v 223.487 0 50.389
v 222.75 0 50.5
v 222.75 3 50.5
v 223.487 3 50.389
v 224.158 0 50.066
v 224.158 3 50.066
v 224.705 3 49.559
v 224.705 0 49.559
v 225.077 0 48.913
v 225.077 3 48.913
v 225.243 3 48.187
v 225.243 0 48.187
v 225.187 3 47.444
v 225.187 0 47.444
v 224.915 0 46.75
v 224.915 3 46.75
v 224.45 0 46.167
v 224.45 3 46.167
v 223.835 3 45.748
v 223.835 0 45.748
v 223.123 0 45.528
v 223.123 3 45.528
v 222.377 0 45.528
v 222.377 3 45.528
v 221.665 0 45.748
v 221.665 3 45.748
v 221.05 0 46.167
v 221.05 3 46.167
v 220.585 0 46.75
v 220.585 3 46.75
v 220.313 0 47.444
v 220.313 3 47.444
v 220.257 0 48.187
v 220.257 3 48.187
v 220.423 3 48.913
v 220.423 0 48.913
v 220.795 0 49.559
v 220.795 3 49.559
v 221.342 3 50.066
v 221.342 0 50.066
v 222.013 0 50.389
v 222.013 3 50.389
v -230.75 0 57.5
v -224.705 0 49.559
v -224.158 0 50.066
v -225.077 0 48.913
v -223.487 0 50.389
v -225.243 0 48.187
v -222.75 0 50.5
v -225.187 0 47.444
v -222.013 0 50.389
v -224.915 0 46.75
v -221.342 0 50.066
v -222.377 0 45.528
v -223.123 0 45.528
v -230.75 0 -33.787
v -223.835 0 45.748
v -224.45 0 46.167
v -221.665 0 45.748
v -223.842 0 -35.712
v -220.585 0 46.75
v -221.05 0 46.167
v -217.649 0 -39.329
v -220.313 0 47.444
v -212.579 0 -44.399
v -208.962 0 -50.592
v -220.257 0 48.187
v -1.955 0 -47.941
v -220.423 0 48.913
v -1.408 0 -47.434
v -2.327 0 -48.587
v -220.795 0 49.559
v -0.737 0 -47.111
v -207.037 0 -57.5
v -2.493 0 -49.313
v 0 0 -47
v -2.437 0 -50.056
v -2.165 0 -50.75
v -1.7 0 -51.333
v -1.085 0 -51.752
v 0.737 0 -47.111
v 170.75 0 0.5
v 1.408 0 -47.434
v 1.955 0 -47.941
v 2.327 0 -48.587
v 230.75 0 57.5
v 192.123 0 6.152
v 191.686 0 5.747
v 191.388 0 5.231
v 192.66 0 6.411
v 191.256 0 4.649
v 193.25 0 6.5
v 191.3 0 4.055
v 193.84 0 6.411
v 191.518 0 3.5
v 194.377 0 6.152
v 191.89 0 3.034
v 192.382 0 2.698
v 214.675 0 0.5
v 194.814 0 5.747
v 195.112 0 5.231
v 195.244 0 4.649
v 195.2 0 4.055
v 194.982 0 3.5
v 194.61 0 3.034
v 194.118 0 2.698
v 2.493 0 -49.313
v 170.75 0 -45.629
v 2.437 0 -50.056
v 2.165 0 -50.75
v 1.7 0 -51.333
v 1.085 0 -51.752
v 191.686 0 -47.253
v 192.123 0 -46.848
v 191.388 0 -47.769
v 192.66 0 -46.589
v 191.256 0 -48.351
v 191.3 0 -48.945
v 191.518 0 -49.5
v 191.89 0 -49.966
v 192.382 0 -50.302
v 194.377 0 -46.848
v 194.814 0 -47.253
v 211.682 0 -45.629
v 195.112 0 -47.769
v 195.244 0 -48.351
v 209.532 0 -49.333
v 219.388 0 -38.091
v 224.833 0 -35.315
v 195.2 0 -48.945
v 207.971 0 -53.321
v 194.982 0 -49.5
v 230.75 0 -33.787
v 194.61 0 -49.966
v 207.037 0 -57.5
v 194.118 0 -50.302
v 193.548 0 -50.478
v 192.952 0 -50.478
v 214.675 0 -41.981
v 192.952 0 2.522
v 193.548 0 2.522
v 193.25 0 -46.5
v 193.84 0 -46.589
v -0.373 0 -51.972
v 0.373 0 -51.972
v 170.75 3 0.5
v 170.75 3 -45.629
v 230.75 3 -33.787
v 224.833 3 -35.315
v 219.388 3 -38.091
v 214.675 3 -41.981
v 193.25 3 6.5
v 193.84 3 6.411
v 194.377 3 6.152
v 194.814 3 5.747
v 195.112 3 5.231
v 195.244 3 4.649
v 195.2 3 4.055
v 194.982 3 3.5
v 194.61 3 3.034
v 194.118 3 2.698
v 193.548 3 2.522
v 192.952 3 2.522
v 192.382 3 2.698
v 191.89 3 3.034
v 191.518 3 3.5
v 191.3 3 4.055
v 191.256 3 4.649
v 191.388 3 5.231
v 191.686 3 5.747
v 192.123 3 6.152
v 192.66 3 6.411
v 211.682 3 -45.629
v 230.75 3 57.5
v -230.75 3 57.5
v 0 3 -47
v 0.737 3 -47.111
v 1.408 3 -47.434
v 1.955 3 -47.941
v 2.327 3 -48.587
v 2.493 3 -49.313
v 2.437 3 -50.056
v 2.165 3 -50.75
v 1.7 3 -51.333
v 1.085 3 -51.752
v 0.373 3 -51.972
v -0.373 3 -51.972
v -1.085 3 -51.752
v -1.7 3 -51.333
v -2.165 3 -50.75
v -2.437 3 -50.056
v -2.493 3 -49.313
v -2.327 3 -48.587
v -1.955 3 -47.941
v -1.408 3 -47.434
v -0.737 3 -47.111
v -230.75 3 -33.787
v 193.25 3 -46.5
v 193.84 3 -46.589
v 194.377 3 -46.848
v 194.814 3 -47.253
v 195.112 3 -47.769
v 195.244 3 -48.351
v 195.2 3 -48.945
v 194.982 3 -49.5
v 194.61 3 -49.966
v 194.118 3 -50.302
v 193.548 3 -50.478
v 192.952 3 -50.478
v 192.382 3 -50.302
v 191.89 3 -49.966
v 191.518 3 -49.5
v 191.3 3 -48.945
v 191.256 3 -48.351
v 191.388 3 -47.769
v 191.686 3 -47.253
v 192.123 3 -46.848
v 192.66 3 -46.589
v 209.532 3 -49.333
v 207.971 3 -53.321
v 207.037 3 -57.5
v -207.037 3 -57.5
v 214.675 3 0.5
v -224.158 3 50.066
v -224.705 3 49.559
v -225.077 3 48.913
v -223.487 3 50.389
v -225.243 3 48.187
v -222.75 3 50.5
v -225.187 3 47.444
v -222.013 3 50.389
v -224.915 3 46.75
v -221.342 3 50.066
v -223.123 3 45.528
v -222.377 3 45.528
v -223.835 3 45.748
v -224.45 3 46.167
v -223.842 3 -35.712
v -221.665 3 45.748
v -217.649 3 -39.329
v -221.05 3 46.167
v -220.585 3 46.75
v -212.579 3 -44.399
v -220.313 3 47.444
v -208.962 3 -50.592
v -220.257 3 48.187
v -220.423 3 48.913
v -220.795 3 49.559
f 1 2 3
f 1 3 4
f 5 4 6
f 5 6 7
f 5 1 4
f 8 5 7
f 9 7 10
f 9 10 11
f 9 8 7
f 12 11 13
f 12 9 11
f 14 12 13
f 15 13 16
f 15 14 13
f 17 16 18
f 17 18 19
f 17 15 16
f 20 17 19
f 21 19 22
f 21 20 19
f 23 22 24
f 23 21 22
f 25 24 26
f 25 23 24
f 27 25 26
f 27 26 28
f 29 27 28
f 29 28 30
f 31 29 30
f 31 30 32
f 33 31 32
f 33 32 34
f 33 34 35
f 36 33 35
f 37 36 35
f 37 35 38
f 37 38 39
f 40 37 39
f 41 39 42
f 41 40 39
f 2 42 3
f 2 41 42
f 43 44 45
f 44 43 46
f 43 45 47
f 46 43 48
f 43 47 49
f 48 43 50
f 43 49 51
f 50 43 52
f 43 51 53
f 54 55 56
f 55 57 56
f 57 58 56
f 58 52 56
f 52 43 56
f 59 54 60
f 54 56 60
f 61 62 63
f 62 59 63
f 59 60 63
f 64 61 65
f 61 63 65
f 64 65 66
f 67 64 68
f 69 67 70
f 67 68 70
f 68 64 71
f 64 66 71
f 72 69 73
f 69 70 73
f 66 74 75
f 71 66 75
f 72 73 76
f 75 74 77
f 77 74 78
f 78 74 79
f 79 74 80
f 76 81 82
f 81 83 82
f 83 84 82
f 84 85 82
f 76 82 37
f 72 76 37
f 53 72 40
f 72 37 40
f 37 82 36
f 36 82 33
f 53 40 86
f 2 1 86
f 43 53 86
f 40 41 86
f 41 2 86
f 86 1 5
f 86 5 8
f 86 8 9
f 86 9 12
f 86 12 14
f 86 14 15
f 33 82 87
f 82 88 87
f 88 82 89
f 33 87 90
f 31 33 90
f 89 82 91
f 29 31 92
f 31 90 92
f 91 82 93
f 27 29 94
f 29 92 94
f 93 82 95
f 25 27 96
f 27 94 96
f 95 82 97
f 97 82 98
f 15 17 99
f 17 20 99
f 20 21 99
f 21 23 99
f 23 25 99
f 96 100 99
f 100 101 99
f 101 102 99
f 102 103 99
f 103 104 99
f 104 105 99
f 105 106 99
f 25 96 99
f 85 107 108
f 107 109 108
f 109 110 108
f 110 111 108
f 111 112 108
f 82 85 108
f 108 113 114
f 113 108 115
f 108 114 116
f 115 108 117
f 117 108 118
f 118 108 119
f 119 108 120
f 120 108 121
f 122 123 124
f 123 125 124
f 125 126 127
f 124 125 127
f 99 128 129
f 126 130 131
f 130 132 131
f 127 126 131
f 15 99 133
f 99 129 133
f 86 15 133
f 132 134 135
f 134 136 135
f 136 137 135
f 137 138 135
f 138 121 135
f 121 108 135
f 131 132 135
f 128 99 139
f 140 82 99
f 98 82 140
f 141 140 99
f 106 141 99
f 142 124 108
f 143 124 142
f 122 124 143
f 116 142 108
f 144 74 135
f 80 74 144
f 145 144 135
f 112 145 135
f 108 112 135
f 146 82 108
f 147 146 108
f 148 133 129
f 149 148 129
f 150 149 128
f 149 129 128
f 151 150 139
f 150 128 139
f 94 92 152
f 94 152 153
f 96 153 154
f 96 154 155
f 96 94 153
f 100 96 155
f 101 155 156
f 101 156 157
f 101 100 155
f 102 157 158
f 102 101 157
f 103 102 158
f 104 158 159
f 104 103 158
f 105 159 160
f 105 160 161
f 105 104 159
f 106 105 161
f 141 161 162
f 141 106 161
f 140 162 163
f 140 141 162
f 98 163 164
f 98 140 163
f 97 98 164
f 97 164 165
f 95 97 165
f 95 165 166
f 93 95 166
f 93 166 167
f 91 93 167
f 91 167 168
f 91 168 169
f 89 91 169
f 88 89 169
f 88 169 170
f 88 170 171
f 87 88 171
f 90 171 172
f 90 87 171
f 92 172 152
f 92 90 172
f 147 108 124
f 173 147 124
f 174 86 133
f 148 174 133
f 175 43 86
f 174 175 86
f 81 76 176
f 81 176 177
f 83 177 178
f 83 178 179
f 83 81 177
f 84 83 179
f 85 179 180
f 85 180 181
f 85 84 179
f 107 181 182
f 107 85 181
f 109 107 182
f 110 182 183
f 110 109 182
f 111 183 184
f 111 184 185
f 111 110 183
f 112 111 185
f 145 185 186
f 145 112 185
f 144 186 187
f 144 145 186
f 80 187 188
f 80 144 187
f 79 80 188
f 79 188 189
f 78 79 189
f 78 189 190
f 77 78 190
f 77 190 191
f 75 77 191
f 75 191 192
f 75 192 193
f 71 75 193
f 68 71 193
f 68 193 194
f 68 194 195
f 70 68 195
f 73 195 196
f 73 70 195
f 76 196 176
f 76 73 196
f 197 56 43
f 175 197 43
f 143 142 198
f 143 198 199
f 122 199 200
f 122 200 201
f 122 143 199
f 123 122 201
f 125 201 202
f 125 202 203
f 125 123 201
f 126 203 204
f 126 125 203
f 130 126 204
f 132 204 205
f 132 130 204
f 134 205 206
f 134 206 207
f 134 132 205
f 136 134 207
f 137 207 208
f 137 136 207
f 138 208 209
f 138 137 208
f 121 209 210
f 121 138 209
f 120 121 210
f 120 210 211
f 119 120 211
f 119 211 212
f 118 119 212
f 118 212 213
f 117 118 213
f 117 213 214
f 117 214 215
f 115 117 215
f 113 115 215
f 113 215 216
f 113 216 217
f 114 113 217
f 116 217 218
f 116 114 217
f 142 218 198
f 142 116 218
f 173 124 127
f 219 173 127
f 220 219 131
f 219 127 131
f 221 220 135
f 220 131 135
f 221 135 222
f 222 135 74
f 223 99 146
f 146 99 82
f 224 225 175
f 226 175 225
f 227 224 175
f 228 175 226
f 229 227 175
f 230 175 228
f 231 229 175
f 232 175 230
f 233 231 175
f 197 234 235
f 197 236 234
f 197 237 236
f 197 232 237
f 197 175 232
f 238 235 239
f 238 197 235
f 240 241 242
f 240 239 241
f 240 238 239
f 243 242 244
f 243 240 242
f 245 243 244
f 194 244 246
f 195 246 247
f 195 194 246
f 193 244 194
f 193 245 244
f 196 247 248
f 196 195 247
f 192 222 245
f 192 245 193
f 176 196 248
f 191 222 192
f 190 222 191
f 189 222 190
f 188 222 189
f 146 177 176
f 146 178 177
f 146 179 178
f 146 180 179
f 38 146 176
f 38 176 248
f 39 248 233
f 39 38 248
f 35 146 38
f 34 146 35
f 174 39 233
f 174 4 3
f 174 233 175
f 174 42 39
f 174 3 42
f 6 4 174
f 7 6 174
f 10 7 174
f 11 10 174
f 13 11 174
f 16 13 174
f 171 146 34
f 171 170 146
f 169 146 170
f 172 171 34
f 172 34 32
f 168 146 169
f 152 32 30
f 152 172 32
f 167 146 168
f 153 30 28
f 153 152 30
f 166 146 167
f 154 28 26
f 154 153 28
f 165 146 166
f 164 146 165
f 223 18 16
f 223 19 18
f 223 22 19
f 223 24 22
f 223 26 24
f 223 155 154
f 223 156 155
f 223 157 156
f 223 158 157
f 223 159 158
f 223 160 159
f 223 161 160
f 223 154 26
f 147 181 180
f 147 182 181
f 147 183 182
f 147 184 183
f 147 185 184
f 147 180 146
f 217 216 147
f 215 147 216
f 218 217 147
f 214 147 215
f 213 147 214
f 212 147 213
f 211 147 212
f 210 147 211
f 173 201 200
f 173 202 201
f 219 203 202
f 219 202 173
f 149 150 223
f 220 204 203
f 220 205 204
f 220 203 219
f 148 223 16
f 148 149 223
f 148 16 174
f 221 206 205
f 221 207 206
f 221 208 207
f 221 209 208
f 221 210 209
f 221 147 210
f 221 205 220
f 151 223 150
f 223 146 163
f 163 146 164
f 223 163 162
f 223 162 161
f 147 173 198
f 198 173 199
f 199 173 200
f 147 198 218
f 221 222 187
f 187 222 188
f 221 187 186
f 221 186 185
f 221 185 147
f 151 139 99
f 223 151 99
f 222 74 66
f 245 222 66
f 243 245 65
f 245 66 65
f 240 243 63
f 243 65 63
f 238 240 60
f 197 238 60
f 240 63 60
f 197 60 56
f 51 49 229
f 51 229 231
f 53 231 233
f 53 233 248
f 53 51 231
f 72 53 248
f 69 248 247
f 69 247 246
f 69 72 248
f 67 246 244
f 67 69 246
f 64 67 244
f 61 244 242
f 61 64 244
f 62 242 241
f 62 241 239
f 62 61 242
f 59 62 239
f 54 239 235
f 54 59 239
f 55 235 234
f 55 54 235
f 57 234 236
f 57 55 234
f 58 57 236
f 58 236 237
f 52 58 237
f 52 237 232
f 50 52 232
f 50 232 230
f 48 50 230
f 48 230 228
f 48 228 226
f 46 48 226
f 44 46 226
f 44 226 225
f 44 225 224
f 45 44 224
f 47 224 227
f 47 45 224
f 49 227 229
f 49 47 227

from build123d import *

# Parameters (mm, degrees)
CROQUIS1_R              = 2.5
CROQUIS1_R_2            = 2
SALIENTE_EXTRUIR1_DEPTH = 3


with BuildPart() as part:
    # Croquis1 → Saliente-Extruir1 (new body)
    with BuildSketch(Plane(origin=(0, 0, 0), x_dir=(1, 0, 0), z_dir=(0, 1, 0))):
        with BuildLine():
            Line((-230.75, -57.5), (230.75, -57.5))
            Line((230.75, -57.5), (230.75, 33.787187079))
            ThreePointArc((230.75, 33.787187079), (222.034128097, 36.553926125), (214.674528302, 41.981407938))
            Line((214.674528302, 41.981407938), (214.674528302, -0.5))
            Line((214.674528302, -0.5), (170.75, -0.5))
            Line((170.75, -0.5), (170.75, 45.629458388))
            Line((170.75, 45.629458388), (211.682145549, 45.629458388))
            ThreePointArc((211.682145549, 45.629458388), (208.675175279, 51.296886956), (207.037187079, 57.5))
            Line((207.037187079, 57.5), (-207.037187079, 57.5))
            ThreePointArc((-207.037187079, 57.5), (-214.951010127, 41.701010127), (-230.75, 33.787187079))
            Line((-230.75, 33.787187079), (-230.75, -57.5))
        make_face()
        with Locations(Location((0, 49.5, 0), (0, 0, 270))):
            Circle(CROQUIS1_R, mode=Mode.SUBTRACT)
        with Locations(Location((193.25, 48.5, 0), (0, 0, 270))):
            Circle(CROQUIS1_R_2, mode=Mode.SUBTRACT)
        with Locations(Location((193.25, -4.5, 0), (0, 0, 270))):
            Circle(CROQUIS1_R_2, mode=Mode.SUBTRACT)
        with Locations(Location((222.75, -48, 0), (0, 0, 270))):
            Circle(CROQUIS1_R, mode=Mode.SUBTRACT)
        with Locations(Location((-222.75, -48, 0), (0, 0, 270))):
            Circle(CROQUIS1_R, mode=Mode.SUBTRACT)
    extrude(amount=SALIENTE_EXTRUIR1_DEPTH)


solid = part.part
